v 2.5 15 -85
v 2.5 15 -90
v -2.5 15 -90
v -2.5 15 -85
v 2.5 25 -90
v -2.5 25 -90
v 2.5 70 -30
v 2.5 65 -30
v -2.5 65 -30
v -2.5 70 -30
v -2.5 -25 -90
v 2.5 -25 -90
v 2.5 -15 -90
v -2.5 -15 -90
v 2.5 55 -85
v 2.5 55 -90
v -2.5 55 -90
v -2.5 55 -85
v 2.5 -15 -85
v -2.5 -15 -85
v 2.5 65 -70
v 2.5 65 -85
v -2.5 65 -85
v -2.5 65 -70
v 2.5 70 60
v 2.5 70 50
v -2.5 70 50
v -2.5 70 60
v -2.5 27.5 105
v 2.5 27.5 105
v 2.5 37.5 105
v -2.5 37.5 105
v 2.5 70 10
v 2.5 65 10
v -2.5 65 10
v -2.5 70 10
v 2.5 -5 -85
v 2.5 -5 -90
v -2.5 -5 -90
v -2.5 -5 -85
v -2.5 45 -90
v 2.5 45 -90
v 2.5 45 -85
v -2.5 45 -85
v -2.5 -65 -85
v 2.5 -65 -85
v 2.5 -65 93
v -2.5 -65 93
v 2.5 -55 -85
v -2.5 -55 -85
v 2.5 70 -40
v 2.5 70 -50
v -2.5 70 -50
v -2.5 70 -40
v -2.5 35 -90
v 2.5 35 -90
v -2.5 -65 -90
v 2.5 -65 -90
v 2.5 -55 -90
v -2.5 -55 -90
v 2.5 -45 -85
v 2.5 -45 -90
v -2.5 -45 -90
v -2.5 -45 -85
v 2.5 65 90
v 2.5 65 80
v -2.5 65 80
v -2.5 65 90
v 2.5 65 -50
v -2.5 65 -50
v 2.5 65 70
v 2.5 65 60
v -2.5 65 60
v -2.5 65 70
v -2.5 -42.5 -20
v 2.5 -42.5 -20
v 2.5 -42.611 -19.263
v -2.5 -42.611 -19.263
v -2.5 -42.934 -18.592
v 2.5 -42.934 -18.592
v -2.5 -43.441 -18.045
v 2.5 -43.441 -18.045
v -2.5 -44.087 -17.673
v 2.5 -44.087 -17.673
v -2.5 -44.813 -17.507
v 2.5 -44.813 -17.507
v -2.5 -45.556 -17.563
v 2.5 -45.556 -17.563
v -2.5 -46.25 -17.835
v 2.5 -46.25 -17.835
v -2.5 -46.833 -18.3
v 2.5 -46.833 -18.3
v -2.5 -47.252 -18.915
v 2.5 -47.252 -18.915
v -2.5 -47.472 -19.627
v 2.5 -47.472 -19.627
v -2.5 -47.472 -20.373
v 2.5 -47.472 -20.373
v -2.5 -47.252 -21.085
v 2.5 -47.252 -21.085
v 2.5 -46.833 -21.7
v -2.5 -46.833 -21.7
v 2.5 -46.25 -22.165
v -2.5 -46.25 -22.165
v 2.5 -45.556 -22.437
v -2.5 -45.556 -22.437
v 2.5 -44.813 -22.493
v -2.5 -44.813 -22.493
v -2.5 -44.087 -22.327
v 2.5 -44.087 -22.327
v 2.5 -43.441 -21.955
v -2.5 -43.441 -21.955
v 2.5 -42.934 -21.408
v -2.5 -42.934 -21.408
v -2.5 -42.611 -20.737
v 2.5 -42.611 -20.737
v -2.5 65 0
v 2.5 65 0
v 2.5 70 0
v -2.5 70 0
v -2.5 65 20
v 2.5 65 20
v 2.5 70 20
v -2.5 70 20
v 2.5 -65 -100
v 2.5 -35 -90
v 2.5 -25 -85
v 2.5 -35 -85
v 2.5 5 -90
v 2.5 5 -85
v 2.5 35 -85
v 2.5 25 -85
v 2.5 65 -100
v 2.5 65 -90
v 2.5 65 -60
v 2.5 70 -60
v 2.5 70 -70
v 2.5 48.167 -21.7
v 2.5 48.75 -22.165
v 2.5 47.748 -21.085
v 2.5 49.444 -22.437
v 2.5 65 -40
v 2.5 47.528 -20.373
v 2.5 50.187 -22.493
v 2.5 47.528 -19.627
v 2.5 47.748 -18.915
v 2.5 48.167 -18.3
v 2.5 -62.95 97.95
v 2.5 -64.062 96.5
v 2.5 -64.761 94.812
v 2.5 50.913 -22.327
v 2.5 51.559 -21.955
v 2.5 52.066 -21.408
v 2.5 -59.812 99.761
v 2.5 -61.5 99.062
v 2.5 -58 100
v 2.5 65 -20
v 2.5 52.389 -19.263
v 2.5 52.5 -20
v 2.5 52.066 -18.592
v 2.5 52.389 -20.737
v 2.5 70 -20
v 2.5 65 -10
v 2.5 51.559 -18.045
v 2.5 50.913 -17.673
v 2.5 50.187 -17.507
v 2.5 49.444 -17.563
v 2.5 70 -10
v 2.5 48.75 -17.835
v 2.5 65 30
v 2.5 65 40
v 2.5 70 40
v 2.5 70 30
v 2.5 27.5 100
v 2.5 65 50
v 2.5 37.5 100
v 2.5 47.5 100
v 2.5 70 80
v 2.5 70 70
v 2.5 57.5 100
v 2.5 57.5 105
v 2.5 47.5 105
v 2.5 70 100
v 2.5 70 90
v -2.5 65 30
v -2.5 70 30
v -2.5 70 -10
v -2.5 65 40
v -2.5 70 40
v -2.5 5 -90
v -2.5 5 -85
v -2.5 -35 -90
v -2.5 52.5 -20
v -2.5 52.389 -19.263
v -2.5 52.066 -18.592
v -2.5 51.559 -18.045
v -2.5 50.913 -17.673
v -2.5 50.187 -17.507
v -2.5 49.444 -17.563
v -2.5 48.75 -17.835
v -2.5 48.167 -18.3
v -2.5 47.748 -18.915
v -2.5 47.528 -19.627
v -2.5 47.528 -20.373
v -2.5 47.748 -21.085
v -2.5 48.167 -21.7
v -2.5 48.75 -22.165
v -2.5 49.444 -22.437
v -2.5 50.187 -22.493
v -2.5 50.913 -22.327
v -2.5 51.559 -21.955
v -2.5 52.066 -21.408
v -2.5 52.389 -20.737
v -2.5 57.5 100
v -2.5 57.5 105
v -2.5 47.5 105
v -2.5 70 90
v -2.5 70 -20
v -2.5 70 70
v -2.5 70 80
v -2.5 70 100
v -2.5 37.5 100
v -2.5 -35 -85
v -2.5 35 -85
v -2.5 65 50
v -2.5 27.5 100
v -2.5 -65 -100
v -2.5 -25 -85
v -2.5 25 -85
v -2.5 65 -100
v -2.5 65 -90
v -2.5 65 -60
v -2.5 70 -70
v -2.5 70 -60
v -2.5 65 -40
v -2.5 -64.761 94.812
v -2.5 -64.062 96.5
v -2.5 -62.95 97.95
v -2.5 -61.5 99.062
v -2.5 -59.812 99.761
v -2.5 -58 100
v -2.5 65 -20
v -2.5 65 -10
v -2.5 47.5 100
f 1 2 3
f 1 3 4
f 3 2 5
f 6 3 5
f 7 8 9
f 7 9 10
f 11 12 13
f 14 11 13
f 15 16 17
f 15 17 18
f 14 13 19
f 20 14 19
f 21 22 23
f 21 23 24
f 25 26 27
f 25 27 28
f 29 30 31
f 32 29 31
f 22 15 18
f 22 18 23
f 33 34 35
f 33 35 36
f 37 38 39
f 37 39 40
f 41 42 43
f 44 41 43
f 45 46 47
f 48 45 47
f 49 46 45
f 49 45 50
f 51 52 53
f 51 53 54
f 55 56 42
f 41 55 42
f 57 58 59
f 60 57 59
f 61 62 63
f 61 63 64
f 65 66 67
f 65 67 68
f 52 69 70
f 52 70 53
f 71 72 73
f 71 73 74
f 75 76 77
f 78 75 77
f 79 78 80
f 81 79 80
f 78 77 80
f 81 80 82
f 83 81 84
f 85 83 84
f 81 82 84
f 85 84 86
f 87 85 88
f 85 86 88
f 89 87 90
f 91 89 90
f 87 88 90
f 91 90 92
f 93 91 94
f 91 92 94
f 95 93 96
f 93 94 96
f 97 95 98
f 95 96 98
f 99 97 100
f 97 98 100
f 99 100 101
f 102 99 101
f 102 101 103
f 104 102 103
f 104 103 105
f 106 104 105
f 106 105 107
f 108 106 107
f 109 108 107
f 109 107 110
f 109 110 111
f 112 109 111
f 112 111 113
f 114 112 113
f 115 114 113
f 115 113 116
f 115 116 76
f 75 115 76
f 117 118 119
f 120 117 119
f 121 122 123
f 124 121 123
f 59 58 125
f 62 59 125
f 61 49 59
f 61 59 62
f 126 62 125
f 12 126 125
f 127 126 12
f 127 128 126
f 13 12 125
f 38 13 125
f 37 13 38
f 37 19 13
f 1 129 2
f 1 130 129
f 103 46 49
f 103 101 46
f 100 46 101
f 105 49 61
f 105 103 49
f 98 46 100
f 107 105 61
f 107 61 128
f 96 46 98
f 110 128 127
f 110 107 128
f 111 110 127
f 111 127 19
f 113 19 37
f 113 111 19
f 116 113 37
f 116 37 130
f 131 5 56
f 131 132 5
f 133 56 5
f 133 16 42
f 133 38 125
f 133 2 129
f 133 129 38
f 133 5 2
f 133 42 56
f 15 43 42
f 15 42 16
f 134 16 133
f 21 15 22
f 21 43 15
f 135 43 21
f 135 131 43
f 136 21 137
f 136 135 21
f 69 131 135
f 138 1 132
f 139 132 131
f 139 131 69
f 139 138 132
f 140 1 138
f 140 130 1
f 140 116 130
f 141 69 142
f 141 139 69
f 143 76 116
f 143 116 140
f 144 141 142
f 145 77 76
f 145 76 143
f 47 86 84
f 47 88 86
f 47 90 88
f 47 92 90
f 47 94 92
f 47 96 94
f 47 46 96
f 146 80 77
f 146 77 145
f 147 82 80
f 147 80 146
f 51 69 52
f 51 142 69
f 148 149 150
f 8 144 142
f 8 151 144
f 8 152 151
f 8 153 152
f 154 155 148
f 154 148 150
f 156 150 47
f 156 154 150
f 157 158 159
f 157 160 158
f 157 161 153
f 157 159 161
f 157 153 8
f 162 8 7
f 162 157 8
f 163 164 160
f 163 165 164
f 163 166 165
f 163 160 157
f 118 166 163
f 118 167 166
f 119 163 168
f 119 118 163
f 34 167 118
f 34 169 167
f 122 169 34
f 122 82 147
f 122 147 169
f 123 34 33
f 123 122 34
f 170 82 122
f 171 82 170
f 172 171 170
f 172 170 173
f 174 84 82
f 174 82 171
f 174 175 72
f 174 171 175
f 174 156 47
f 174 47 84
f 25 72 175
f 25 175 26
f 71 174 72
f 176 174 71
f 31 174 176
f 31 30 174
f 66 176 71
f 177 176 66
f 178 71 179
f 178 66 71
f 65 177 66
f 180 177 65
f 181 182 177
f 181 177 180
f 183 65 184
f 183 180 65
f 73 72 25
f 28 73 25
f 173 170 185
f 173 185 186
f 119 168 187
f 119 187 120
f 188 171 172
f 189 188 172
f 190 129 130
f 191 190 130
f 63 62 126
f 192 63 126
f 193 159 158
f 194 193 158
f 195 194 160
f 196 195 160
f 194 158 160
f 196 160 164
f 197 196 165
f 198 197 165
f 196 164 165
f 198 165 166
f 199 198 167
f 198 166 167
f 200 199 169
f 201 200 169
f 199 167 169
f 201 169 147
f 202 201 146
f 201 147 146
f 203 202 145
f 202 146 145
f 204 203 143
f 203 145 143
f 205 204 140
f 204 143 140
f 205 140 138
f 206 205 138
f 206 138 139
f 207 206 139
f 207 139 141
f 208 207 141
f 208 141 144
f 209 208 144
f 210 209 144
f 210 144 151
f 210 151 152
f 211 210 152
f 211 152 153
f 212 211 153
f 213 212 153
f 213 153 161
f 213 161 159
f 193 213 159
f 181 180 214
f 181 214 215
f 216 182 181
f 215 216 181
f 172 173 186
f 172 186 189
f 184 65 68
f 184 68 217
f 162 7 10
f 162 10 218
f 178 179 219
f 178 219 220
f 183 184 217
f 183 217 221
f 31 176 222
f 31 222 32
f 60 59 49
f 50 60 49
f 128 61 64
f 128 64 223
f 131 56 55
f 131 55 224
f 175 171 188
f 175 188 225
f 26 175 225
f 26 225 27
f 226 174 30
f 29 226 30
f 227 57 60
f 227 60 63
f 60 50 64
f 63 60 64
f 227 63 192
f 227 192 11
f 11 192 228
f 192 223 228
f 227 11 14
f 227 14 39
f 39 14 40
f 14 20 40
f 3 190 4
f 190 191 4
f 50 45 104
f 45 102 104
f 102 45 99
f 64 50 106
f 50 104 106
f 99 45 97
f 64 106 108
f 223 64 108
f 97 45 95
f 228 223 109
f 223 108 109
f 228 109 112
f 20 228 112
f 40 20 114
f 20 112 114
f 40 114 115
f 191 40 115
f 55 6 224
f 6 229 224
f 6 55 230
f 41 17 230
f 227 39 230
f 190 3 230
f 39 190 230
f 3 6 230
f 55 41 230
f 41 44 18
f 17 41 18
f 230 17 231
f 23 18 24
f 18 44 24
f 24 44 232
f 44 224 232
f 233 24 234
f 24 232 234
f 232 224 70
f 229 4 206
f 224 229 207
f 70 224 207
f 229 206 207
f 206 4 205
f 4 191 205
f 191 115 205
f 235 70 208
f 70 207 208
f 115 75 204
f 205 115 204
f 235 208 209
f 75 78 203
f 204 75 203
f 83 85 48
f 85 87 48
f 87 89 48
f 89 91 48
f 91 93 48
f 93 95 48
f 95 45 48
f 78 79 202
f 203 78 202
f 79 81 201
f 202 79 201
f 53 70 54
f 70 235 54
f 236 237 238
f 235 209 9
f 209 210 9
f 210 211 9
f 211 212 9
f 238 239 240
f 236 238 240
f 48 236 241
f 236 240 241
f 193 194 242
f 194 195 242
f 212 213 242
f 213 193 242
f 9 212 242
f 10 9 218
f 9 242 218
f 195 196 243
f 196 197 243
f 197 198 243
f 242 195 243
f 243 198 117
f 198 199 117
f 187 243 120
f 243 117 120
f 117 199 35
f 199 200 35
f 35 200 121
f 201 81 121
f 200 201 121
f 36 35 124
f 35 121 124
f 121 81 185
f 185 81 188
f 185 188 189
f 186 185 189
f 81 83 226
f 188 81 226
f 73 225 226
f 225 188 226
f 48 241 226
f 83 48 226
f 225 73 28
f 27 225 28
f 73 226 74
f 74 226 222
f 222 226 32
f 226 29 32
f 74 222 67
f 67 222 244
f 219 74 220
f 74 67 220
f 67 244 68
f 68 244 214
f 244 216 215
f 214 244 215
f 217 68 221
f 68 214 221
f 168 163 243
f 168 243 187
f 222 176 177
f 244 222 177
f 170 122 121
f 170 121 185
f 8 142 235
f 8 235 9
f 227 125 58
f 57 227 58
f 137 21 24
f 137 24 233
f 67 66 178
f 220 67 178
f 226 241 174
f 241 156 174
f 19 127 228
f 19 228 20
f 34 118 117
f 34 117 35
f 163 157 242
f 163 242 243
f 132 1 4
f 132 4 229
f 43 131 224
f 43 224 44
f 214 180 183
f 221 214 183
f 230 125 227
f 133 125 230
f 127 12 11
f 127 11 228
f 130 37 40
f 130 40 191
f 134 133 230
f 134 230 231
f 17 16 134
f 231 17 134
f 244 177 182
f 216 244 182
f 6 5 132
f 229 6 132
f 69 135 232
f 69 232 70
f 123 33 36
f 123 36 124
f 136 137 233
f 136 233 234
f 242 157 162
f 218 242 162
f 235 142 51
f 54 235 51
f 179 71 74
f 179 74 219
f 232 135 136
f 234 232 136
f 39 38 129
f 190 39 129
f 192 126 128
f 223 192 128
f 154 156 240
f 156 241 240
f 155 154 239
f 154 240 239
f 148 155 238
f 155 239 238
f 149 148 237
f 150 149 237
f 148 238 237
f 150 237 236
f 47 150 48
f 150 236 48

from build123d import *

# Parameters (mm, degrees)
SKETCH_W        = 130
SKETCH_H        = 200
PAD_DEPTH       = 2.5
SKETCH001_R     = 2.5
POCKET_DEPTH    = 5.001
SKETCH002_W     = 10
SKETCH002_H     = 5
POCKET001_DEPTH = 5.001
SKETCH003_W     = 5
SKETCH003_H     = 10
PAD001_DEPTH    = 5
SKETCH004_W     = 10
SKETCH004_H     = 5
PAD002_DEPTH    = 5
FILLET_R        = 7


with BuildPart() as part:
    # Sketch → Pad (new body, symmetric)
    with BuildSketch(Plane.YZ):
        Rectangle(SKETCH_W, SKETCH_H)
    extrude(amount=PAD_DEPTH, both=True)

    # Sketch001 (on Face6 of Pad) → Pocket (cut, through all)
    with BuildSketch(Plane.YZ.offset(2.5)):
        with Locations((-45, -20)):
            Circle(SKETCH001_R)
        with Locations((50, -20)):
            Circle(SKETCH001_R)
    extrude(amount=-POCKET_DEPTH, mode=Mode.SUBTRACT)

    # Sketch002 (on Face5 of Pocket) → Pocket001 (cut, through all)
    with BuildSketch(Plane.YZ.offset(2.5)):
        with Locations((-60, -87.5)):
            Rectangle(SKETCH002_W, SKETCH002_H)
        with Locations((-40, -87.5)):
            Rectangle(SKETCH002_W, SKETCH002_H)
        with Locations((-20, -87.5)):
            Rectangle(SKETCH002_W, SKETCH002_H)
        with Locations((0, -87.5)):
            Rectangle(SKETCH002_W, SKETCH002_H)
        with Locations((20, -87.5)):
            Rectangle(SKETCH002_W, SKETCH002_H)
        with Locations((40, -87.5)):
            Rectangle(SKETCH002_W, SKETCH002_H)
        with Locations((60, -87.5)):
            Rectangle(SKETCH002_W, SKETCH002_H)
    extrude(amount=-POCKET001_DEPTH, mode=Mode.SUBTRACT)

    # Sketch003 (on Face5 of Pocket001) → Pad001 (join)
    with BuildSketch(Plane.YZ.offset(2.5)):
        with Locations((67.5, 95)):
            Rectangle(SKETCH003_W, SKETCH003_H)
        with Locations((67.5, 75)):
            Rectangle(SKETCH003_W, SKETCH003_H)
        with Locations((67.5, 55)):
            Rectangle(SKETCH003_W, SKETCH003_H)
        with Locations((67.5, 35)):
            Rectangle(SKETCH003_W, SKETCH003_H)
        with Locations((67.5, 15)):
            Rectangle(SKETCH003_W, SKETCH003_H)
        with Locations((67.5, -5)):
            Rectangle(SKETCH003_W, SKETCH003_H)
        with Locations((67.5, -25)):
            Rectangle(SKETCH003_W, SKETCH003_H)
        with Locations((67.5, -45)):
            Rectangle(SKETCH003_W, SKETCH003_H)
        with Locations((67.5, -65)):
            Rectangle(SKETCH003_W, SKETCH003_H)
    extrude(amount=-PAD001_DEPTH)

    # Sketch004 (on Face69 of Pad001) → Pad002 (join)
    with BuildSketch(Plane.YZ.offset(2.5)):
        with Locations((32.5, 102.5)):
            Rectangle(SKETCH004_W, SKETCH004_H)
        with Locations((52.5, 102.5)):
            Rectangle(SKETCH004_W, SKETCH004_H)
    extrude(amount=-PAD002_DEPTH)

    # Fillet
    fillet_edges = [part.edges().sort_by_distance(p)[0] for p in [
        (0, -65, 100),
    ]]
    fillet(fillet_edges, radius=FILLET_R)


solid = part.part
